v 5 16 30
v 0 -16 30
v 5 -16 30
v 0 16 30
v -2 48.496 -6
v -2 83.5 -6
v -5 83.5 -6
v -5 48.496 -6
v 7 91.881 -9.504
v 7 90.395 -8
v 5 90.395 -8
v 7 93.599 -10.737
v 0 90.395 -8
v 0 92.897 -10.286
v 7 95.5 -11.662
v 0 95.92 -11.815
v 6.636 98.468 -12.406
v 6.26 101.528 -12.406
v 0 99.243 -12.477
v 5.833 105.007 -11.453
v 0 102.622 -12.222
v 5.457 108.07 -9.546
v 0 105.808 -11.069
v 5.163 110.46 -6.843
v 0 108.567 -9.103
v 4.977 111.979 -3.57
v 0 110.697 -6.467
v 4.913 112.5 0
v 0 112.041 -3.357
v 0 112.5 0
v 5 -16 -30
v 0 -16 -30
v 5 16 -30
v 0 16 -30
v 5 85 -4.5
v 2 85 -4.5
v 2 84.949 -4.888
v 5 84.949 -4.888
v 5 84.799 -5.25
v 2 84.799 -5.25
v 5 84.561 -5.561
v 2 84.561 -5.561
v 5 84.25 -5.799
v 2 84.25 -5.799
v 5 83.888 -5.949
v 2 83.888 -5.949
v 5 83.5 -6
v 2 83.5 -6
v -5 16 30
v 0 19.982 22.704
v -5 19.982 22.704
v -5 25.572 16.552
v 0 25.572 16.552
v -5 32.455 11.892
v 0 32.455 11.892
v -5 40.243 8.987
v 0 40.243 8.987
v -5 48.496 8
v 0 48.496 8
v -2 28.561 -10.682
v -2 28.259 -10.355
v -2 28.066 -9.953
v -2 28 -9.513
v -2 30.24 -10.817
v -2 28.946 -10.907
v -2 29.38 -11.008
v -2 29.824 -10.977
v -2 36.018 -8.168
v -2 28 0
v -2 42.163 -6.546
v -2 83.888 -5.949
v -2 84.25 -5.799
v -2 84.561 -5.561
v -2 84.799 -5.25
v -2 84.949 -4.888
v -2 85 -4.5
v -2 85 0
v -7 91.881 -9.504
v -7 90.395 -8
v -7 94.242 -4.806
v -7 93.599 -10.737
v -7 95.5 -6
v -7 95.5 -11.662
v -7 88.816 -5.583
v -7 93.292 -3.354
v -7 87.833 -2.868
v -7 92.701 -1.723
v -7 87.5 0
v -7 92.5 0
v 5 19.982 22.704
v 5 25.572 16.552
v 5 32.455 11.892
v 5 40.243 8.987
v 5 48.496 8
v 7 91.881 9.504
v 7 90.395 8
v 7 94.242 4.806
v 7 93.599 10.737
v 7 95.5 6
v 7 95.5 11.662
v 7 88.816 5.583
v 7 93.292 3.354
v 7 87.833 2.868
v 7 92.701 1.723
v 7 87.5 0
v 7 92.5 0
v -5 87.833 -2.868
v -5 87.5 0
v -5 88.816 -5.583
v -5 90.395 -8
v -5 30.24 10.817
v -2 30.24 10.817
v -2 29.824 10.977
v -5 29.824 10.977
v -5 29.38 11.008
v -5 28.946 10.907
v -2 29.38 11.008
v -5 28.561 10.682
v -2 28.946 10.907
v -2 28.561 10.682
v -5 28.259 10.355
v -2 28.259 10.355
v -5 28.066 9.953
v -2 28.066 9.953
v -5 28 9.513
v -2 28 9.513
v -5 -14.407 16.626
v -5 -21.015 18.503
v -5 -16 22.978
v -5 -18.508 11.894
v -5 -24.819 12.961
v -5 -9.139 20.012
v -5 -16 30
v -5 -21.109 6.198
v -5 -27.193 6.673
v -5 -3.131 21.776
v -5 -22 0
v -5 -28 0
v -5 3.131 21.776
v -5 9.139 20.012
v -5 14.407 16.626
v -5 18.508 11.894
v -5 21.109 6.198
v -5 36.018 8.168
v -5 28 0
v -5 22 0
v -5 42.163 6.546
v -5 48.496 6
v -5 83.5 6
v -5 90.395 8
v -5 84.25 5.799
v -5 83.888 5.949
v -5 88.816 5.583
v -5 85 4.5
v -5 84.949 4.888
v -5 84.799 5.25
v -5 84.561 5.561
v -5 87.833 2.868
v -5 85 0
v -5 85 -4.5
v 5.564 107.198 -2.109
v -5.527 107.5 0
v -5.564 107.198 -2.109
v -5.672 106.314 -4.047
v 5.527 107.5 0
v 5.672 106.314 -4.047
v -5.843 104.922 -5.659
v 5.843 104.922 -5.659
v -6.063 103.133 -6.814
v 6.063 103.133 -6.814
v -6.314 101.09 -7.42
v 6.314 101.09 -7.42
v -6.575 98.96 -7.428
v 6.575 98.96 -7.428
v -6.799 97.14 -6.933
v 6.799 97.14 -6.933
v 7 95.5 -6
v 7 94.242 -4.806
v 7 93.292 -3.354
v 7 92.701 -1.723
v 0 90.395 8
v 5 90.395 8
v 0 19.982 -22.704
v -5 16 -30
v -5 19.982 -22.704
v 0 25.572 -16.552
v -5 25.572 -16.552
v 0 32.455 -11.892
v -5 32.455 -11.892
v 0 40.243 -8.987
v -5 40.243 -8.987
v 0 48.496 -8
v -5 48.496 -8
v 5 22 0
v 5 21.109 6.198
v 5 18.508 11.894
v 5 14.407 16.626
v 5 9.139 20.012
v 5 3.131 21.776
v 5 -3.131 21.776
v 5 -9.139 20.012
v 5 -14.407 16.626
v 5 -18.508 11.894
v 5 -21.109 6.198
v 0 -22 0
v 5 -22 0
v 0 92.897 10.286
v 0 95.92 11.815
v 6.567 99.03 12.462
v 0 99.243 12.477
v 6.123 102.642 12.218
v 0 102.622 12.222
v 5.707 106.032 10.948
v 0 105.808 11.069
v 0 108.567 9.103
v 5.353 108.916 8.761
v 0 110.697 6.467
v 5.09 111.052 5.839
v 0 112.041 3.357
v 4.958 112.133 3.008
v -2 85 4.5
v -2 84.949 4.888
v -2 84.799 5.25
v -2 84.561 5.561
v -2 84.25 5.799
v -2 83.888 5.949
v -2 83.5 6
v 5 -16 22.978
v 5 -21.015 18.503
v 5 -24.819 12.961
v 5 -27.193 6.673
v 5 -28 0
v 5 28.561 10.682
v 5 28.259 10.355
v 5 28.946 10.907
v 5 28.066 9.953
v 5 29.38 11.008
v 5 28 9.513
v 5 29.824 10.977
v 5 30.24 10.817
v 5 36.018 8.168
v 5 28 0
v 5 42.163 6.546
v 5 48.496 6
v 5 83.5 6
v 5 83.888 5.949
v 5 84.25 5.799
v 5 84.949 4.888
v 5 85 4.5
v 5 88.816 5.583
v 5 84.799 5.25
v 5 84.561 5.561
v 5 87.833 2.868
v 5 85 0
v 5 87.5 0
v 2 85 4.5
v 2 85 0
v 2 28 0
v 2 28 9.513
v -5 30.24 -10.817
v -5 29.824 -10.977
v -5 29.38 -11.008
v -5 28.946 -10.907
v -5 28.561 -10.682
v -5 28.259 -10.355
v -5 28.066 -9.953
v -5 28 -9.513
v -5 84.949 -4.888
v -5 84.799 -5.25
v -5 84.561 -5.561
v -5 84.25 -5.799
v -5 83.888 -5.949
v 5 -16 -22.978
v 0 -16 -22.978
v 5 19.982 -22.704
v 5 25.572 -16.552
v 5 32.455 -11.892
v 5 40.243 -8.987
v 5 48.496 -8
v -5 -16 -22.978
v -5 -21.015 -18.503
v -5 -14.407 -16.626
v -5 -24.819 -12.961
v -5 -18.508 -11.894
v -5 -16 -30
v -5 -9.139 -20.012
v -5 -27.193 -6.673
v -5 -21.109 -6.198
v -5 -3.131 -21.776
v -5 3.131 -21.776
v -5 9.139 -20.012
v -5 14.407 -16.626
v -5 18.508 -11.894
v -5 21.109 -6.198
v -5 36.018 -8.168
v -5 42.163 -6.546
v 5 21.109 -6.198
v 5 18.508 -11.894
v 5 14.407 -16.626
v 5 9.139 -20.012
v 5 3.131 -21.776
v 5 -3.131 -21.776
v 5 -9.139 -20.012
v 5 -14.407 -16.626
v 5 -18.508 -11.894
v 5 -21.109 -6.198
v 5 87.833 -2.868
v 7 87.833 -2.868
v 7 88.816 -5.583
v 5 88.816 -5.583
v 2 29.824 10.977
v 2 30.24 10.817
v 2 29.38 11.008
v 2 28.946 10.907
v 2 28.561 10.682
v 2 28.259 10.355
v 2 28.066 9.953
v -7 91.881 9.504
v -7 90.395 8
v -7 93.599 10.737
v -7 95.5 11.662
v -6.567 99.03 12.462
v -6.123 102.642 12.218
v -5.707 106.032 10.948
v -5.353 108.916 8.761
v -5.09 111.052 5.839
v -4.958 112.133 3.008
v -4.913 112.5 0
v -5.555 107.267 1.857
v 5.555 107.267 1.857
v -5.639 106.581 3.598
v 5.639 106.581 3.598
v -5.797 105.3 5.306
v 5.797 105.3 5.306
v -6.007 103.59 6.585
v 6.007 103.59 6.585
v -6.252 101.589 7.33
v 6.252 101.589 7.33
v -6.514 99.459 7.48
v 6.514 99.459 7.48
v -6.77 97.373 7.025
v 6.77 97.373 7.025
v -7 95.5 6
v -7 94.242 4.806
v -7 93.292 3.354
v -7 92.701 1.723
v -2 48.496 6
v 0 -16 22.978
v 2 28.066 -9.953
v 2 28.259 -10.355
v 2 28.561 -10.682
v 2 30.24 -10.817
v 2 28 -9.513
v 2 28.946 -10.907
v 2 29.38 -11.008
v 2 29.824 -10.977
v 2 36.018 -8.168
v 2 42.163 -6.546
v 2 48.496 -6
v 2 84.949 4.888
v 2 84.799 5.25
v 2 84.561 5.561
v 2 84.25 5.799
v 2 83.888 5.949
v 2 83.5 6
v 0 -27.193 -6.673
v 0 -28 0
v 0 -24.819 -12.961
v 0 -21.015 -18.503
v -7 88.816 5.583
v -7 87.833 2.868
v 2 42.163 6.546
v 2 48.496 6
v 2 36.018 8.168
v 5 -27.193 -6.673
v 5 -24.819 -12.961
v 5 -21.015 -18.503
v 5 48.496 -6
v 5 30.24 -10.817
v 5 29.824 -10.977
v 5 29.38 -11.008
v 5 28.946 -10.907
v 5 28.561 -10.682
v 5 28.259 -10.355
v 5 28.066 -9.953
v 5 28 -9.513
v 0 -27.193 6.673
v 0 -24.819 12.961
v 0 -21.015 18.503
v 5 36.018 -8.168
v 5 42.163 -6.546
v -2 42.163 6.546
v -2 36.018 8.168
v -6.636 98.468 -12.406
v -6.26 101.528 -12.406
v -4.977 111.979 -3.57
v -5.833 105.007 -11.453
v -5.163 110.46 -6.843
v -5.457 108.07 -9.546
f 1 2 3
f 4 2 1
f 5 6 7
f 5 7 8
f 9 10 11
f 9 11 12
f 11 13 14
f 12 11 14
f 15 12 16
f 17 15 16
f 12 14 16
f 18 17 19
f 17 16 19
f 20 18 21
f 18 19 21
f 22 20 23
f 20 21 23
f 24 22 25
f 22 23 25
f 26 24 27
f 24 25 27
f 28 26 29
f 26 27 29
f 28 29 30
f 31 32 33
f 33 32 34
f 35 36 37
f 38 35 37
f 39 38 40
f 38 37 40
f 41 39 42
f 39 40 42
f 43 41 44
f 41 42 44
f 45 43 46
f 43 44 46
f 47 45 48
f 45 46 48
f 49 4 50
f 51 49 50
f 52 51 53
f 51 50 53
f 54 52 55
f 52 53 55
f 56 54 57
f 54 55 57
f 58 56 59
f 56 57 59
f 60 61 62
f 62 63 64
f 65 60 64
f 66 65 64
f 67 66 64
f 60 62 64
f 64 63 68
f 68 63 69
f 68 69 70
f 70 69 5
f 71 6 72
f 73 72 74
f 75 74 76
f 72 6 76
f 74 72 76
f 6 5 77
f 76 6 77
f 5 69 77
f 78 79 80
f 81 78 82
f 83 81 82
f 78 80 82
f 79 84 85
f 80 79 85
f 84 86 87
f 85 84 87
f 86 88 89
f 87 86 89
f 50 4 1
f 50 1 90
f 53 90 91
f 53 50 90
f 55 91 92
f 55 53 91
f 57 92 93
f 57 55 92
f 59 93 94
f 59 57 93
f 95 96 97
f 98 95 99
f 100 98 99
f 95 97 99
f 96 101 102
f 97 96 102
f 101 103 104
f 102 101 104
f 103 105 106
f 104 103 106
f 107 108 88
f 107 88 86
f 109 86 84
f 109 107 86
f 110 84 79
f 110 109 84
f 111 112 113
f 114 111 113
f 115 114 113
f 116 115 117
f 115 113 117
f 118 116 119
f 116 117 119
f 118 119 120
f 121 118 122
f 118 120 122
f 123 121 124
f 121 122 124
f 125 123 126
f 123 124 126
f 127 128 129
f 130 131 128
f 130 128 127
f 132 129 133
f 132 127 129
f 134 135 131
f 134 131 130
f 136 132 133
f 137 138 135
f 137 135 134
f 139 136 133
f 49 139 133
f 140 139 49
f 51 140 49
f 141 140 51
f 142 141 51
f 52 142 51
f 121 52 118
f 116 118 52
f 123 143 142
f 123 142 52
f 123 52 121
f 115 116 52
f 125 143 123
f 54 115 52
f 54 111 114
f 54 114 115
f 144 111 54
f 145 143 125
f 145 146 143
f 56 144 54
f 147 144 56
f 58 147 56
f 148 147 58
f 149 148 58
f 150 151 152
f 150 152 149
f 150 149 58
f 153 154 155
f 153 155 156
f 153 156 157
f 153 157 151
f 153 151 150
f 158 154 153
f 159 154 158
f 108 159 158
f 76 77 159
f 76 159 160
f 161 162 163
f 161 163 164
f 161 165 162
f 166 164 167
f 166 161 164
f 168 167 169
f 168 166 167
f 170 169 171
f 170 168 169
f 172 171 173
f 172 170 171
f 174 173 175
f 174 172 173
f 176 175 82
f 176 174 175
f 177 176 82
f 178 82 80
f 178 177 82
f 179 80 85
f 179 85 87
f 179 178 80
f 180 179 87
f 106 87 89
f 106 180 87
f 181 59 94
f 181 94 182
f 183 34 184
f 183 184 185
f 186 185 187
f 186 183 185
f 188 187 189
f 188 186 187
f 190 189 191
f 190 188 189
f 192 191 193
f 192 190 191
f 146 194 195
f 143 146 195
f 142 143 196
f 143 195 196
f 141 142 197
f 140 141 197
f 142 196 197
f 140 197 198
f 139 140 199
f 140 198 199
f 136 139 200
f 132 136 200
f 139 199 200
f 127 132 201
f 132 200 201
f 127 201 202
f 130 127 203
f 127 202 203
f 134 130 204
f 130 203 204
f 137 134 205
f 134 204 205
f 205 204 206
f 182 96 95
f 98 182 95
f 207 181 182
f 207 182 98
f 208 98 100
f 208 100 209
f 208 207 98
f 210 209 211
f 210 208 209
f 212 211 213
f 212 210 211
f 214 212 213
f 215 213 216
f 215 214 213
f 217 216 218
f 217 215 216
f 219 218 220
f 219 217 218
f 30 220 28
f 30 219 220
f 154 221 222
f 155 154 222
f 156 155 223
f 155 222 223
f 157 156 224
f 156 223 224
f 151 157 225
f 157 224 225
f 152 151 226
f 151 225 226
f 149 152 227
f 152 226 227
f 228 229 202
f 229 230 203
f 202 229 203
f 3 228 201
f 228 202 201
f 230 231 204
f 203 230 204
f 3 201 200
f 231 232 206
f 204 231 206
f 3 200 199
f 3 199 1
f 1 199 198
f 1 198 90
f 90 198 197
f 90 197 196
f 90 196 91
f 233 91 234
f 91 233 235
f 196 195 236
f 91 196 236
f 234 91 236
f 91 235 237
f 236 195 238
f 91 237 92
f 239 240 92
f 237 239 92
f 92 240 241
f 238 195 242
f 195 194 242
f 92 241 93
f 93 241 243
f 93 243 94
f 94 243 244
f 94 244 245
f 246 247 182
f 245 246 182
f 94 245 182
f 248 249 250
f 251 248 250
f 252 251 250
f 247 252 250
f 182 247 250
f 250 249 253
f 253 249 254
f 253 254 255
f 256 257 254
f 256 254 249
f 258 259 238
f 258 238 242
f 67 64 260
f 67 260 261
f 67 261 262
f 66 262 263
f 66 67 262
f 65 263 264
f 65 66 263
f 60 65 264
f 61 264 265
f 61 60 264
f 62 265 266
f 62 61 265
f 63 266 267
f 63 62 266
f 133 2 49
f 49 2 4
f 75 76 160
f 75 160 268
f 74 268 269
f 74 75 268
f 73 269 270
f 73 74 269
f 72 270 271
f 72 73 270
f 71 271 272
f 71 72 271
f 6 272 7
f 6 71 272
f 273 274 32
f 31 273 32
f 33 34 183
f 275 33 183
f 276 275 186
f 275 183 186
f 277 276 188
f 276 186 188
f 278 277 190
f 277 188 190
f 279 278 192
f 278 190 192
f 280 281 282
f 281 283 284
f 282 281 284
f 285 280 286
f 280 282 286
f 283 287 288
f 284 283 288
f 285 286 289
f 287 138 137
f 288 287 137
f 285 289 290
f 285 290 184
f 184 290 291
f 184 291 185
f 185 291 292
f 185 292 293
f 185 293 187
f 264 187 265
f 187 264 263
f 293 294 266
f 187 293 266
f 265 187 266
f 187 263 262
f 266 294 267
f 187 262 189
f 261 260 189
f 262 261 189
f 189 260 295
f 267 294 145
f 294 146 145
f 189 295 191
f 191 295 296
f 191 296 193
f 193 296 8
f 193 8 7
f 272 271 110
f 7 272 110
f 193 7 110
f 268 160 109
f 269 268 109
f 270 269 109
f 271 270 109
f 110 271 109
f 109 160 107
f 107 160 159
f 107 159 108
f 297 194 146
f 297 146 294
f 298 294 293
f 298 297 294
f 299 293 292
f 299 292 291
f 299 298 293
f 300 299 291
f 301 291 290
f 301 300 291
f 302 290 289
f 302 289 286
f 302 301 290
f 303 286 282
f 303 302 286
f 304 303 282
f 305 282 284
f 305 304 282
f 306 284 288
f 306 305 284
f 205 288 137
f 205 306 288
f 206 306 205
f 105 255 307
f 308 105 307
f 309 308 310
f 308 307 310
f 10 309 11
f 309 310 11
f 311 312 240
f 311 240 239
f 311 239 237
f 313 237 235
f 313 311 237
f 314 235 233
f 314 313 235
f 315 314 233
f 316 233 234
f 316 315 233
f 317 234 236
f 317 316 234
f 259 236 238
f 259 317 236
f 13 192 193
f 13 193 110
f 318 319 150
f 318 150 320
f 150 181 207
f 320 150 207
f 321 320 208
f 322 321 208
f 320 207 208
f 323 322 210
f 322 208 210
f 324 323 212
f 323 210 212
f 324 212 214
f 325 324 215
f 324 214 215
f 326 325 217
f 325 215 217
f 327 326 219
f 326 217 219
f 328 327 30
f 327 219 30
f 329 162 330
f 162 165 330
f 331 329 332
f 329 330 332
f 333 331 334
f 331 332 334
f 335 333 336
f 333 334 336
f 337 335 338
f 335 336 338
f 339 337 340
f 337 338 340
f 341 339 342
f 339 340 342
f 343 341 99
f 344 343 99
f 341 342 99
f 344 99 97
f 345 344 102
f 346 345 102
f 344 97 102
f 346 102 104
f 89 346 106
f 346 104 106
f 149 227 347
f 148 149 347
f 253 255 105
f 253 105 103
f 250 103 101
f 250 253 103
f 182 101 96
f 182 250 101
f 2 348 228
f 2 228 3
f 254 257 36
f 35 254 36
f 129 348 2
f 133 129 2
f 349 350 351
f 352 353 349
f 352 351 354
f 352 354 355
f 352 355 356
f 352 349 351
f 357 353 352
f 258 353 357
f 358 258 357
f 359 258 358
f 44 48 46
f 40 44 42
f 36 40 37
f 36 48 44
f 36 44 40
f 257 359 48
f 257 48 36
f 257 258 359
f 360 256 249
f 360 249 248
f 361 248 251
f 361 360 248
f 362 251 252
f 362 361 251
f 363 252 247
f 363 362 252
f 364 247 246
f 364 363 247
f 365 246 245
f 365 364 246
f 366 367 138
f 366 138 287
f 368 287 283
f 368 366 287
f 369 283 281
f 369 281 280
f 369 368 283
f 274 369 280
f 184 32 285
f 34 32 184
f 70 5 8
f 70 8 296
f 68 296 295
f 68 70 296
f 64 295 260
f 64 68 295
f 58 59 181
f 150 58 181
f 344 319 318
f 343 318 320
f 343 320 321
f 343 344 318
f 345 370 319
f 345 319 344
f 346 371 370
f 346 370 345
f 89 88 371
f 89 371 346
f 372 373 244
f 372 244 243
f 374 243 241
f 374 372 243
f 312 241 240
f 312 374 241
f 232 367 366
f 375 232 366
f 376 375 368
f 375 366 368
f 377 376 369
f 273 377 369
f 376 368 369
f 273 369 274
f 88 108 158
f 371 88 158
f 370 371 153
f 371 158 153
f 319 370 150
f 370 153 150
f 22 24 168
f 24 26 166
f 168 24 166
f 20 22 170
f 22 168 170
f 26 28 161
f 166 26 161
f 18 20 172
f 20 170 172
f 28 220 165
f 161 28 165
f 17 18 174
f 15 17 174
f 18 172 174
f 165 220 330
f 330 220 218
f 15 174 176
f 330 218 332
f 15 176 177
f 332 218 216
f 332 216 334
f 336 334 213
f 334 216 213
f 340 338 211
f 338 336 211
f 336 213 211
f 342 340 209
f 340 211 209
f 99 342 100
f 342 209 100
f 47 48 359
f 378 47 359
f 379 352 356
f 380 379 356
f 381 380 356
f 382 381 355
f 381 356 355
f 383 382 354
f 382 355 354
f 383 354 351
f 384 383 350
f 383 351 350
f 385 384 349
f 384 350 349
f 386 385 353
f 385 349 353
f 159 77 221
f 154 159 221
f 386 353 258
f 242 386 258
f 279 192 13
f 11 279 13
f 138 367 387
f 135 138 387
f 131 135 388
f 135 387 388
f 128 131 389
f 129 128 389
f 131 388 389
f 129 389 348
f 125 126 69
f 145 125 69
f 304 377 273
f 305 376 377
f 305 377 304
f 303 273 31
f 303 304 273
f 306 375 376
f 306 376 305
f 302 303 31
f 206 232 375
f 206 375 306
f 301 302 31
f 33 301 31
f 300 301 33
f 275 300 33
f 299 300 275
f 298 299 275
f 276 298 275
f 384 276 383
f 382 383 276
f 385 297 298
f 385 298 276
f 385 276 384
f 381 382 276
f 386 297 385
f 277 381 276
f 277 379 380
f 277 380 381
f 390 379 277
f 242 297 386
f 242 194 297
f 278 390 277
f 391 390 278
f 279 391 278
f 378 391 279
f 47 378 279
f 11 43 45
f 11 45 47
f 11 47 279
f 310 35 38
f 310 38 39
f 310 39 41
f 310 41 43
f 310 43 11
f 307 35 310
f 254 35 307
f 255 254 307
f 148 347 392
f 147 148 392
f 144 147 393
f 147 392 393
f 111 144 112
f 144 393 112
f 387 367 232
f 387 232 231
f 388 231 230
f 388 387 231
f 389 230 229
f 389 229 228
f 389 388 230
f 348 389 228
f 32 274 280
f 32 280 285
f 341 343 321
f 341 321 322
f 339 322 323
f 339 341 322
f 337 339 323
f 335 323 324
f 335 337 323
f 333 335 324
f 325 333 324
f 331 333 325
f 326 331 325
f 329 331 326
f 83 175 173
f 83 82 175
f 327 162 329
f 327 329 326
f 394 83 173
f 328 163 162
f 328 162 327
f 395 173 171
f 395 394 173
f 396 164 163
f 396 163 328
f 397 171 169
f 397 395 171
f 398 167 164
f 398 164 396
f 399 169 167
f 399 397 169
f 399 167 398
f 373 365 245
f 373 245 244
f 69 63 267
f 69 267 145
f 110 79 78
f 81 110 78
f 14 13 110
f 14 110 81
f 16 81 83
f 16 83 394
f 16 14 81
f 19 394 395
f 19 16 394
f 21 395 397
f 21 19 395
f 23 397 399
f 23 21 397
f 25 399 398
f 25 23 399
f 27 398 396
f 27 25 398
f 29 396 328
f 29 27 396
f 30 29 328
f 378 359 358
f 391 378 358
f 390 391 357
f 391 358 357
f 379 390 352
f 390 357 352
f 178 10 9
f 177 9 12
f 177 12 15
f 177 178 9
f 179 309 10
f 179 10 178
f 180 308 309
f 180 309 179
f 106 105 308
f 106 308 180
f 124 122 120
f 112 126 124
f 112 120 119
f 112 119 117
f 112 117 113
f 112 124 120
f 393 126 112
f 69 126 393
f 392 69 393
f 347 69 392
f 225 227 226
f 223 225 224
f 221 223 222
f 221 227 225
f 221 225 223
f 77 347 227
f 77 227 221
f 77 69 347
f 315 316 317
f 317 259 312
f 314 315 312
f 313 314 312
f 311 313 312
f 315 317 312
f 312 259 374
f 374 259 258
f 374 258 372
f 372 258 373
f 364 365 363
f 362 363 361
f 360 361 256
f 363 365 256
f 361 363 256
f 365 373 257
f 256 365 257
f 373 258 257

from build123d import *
from build123d import SkipClean  # not in build123d's __all__

# Parameters (mm, degrees)
F1_DEPTH = 7
F2_DEPTH = 5
F3_DEPTH = 2
F7_DEPTH = 25


with BuildPart() as f1:
    # F0 (on Right) → F1 (new body)
    with BuildSketch(Plane.YZ):
        with BuildLine():
            ThreePointArc((107.5, 0), (100, -7.5), (92.5, 0))
            Line((92.5, 0), (87.5, 0))
            ThreePointArc((87.5, 0), (88.2460947032, -4.2539052968), (90.3953136439, -8))
            ThreePointArc((90.3953136439, -8), (104.2539052968, -11.7539052968), (112.5, 0))
            Line((112.5, 0), (107.5, 0))
        make_face()
    extrude(amount=F1_DEPTH)

    # F0 (on Right) → F2 (join)
    with BuildSketch(Plane.YZ):
        with BuildLine():
            ThreePointArc((90.3953136439, -8), (88.2460947032, -4.2539052968), (87.5, 0))
            Line((87.5, 0), (85, 0))
            Line((85, 0), (85, -4.5))
            ThreePointArc((85, -4.5), (84.5606601718, -5.5606601718), (83.5, -6))
            Line((83.5, -6), (48.4961536185, -6))
            ThreePointArc((48.4961536185, -6), (39.0556702336, -7.2246275567), (30.2401098812, -10.8174446779))
            ThreePointArc((30.2401098812, -10.8174446779), (28.7450711364, -10.8089264191), (28, -9.5127464891))
            Line((28, -9.5127464891), (28, 0))
            Line((28, 0), (22, 0))
            ThreePointArc((22, 0), (0, -22), (-22, 0))
            Line((-22, 0), (-28, 0))
            ThreePointArc((-28, 0), (-24.819347292, -12.9614813968), (-16, -22.9782505862))
            Line((-16, -22.9782505862), (-16, -30))
            Line((-16, -30), (16, -30))
            ThreePointArc((16, -30), (28.8747367482, -14.0172465076), (48.4961536185, -8))
            Line((48.4961536185, -8), (90.3953136439, -8))
        make_face()
    extrude(amount=F2_DEPTH)

    # F0 (on Right) → F3 (join)
    with BuildSketch(Plane.YZ):
        with BuildLine():
            Line((85, -4.5), (85, 0))
            Line((85, 0), (28, 0))
            Line((28, 0), (28, -9.5127464891))
            ThreePointArc((28, -9.5127464891), (28.7450711364, -10.8089264191), (30.2401098812, -10.8174446779))
            ThreePointArc((30.2401098812, -10.8174446779), (39.0556702336, -7.2246275567), (48.4961536185, -6))
            Line((48.4961536185, -6), (83.5, -6))
            ThreePointArc((83.5, -6), (84.5606601718, -5.5606601718), (85, -4.5))
        make_face()
    extrude(amount=F3_DEPTH)

    # F4: F1 across plane


with BuildPart() as f1_1:
    add(f1.part, clean=False)
    add(f1.part.mirror(Plane.YZ), clean=False)

    # F5: F1 across plane


with BuildPart() as f1_2:
    add(f1_1.part, clean=False)
    with SkipClean():  # cleaning this boolean's faces spoils the solid; the shape is the same uncleaned
        add(f1_1.part.mirror(Plane.XY), clean=False)

    # F6 (on Top) → F7 (cut, symmetric)
    with BuildSketch(Plane.XY):
        Polygon((-7, 112.5), (-7, 95.5), (-4.9126624647, 112.5), align=None)
        Polygon((4.9126624647, 112.5), (7, 95.5), (7, 112.5), align=None)
    with SkipClean():  # cleaning this boolean's faces spoils the solid; the shape is the same uncleaned
        extrude(amount=F7_DEPTH, both=True, mode=Mode.SUBTRACT)


solid = f1_2.part
